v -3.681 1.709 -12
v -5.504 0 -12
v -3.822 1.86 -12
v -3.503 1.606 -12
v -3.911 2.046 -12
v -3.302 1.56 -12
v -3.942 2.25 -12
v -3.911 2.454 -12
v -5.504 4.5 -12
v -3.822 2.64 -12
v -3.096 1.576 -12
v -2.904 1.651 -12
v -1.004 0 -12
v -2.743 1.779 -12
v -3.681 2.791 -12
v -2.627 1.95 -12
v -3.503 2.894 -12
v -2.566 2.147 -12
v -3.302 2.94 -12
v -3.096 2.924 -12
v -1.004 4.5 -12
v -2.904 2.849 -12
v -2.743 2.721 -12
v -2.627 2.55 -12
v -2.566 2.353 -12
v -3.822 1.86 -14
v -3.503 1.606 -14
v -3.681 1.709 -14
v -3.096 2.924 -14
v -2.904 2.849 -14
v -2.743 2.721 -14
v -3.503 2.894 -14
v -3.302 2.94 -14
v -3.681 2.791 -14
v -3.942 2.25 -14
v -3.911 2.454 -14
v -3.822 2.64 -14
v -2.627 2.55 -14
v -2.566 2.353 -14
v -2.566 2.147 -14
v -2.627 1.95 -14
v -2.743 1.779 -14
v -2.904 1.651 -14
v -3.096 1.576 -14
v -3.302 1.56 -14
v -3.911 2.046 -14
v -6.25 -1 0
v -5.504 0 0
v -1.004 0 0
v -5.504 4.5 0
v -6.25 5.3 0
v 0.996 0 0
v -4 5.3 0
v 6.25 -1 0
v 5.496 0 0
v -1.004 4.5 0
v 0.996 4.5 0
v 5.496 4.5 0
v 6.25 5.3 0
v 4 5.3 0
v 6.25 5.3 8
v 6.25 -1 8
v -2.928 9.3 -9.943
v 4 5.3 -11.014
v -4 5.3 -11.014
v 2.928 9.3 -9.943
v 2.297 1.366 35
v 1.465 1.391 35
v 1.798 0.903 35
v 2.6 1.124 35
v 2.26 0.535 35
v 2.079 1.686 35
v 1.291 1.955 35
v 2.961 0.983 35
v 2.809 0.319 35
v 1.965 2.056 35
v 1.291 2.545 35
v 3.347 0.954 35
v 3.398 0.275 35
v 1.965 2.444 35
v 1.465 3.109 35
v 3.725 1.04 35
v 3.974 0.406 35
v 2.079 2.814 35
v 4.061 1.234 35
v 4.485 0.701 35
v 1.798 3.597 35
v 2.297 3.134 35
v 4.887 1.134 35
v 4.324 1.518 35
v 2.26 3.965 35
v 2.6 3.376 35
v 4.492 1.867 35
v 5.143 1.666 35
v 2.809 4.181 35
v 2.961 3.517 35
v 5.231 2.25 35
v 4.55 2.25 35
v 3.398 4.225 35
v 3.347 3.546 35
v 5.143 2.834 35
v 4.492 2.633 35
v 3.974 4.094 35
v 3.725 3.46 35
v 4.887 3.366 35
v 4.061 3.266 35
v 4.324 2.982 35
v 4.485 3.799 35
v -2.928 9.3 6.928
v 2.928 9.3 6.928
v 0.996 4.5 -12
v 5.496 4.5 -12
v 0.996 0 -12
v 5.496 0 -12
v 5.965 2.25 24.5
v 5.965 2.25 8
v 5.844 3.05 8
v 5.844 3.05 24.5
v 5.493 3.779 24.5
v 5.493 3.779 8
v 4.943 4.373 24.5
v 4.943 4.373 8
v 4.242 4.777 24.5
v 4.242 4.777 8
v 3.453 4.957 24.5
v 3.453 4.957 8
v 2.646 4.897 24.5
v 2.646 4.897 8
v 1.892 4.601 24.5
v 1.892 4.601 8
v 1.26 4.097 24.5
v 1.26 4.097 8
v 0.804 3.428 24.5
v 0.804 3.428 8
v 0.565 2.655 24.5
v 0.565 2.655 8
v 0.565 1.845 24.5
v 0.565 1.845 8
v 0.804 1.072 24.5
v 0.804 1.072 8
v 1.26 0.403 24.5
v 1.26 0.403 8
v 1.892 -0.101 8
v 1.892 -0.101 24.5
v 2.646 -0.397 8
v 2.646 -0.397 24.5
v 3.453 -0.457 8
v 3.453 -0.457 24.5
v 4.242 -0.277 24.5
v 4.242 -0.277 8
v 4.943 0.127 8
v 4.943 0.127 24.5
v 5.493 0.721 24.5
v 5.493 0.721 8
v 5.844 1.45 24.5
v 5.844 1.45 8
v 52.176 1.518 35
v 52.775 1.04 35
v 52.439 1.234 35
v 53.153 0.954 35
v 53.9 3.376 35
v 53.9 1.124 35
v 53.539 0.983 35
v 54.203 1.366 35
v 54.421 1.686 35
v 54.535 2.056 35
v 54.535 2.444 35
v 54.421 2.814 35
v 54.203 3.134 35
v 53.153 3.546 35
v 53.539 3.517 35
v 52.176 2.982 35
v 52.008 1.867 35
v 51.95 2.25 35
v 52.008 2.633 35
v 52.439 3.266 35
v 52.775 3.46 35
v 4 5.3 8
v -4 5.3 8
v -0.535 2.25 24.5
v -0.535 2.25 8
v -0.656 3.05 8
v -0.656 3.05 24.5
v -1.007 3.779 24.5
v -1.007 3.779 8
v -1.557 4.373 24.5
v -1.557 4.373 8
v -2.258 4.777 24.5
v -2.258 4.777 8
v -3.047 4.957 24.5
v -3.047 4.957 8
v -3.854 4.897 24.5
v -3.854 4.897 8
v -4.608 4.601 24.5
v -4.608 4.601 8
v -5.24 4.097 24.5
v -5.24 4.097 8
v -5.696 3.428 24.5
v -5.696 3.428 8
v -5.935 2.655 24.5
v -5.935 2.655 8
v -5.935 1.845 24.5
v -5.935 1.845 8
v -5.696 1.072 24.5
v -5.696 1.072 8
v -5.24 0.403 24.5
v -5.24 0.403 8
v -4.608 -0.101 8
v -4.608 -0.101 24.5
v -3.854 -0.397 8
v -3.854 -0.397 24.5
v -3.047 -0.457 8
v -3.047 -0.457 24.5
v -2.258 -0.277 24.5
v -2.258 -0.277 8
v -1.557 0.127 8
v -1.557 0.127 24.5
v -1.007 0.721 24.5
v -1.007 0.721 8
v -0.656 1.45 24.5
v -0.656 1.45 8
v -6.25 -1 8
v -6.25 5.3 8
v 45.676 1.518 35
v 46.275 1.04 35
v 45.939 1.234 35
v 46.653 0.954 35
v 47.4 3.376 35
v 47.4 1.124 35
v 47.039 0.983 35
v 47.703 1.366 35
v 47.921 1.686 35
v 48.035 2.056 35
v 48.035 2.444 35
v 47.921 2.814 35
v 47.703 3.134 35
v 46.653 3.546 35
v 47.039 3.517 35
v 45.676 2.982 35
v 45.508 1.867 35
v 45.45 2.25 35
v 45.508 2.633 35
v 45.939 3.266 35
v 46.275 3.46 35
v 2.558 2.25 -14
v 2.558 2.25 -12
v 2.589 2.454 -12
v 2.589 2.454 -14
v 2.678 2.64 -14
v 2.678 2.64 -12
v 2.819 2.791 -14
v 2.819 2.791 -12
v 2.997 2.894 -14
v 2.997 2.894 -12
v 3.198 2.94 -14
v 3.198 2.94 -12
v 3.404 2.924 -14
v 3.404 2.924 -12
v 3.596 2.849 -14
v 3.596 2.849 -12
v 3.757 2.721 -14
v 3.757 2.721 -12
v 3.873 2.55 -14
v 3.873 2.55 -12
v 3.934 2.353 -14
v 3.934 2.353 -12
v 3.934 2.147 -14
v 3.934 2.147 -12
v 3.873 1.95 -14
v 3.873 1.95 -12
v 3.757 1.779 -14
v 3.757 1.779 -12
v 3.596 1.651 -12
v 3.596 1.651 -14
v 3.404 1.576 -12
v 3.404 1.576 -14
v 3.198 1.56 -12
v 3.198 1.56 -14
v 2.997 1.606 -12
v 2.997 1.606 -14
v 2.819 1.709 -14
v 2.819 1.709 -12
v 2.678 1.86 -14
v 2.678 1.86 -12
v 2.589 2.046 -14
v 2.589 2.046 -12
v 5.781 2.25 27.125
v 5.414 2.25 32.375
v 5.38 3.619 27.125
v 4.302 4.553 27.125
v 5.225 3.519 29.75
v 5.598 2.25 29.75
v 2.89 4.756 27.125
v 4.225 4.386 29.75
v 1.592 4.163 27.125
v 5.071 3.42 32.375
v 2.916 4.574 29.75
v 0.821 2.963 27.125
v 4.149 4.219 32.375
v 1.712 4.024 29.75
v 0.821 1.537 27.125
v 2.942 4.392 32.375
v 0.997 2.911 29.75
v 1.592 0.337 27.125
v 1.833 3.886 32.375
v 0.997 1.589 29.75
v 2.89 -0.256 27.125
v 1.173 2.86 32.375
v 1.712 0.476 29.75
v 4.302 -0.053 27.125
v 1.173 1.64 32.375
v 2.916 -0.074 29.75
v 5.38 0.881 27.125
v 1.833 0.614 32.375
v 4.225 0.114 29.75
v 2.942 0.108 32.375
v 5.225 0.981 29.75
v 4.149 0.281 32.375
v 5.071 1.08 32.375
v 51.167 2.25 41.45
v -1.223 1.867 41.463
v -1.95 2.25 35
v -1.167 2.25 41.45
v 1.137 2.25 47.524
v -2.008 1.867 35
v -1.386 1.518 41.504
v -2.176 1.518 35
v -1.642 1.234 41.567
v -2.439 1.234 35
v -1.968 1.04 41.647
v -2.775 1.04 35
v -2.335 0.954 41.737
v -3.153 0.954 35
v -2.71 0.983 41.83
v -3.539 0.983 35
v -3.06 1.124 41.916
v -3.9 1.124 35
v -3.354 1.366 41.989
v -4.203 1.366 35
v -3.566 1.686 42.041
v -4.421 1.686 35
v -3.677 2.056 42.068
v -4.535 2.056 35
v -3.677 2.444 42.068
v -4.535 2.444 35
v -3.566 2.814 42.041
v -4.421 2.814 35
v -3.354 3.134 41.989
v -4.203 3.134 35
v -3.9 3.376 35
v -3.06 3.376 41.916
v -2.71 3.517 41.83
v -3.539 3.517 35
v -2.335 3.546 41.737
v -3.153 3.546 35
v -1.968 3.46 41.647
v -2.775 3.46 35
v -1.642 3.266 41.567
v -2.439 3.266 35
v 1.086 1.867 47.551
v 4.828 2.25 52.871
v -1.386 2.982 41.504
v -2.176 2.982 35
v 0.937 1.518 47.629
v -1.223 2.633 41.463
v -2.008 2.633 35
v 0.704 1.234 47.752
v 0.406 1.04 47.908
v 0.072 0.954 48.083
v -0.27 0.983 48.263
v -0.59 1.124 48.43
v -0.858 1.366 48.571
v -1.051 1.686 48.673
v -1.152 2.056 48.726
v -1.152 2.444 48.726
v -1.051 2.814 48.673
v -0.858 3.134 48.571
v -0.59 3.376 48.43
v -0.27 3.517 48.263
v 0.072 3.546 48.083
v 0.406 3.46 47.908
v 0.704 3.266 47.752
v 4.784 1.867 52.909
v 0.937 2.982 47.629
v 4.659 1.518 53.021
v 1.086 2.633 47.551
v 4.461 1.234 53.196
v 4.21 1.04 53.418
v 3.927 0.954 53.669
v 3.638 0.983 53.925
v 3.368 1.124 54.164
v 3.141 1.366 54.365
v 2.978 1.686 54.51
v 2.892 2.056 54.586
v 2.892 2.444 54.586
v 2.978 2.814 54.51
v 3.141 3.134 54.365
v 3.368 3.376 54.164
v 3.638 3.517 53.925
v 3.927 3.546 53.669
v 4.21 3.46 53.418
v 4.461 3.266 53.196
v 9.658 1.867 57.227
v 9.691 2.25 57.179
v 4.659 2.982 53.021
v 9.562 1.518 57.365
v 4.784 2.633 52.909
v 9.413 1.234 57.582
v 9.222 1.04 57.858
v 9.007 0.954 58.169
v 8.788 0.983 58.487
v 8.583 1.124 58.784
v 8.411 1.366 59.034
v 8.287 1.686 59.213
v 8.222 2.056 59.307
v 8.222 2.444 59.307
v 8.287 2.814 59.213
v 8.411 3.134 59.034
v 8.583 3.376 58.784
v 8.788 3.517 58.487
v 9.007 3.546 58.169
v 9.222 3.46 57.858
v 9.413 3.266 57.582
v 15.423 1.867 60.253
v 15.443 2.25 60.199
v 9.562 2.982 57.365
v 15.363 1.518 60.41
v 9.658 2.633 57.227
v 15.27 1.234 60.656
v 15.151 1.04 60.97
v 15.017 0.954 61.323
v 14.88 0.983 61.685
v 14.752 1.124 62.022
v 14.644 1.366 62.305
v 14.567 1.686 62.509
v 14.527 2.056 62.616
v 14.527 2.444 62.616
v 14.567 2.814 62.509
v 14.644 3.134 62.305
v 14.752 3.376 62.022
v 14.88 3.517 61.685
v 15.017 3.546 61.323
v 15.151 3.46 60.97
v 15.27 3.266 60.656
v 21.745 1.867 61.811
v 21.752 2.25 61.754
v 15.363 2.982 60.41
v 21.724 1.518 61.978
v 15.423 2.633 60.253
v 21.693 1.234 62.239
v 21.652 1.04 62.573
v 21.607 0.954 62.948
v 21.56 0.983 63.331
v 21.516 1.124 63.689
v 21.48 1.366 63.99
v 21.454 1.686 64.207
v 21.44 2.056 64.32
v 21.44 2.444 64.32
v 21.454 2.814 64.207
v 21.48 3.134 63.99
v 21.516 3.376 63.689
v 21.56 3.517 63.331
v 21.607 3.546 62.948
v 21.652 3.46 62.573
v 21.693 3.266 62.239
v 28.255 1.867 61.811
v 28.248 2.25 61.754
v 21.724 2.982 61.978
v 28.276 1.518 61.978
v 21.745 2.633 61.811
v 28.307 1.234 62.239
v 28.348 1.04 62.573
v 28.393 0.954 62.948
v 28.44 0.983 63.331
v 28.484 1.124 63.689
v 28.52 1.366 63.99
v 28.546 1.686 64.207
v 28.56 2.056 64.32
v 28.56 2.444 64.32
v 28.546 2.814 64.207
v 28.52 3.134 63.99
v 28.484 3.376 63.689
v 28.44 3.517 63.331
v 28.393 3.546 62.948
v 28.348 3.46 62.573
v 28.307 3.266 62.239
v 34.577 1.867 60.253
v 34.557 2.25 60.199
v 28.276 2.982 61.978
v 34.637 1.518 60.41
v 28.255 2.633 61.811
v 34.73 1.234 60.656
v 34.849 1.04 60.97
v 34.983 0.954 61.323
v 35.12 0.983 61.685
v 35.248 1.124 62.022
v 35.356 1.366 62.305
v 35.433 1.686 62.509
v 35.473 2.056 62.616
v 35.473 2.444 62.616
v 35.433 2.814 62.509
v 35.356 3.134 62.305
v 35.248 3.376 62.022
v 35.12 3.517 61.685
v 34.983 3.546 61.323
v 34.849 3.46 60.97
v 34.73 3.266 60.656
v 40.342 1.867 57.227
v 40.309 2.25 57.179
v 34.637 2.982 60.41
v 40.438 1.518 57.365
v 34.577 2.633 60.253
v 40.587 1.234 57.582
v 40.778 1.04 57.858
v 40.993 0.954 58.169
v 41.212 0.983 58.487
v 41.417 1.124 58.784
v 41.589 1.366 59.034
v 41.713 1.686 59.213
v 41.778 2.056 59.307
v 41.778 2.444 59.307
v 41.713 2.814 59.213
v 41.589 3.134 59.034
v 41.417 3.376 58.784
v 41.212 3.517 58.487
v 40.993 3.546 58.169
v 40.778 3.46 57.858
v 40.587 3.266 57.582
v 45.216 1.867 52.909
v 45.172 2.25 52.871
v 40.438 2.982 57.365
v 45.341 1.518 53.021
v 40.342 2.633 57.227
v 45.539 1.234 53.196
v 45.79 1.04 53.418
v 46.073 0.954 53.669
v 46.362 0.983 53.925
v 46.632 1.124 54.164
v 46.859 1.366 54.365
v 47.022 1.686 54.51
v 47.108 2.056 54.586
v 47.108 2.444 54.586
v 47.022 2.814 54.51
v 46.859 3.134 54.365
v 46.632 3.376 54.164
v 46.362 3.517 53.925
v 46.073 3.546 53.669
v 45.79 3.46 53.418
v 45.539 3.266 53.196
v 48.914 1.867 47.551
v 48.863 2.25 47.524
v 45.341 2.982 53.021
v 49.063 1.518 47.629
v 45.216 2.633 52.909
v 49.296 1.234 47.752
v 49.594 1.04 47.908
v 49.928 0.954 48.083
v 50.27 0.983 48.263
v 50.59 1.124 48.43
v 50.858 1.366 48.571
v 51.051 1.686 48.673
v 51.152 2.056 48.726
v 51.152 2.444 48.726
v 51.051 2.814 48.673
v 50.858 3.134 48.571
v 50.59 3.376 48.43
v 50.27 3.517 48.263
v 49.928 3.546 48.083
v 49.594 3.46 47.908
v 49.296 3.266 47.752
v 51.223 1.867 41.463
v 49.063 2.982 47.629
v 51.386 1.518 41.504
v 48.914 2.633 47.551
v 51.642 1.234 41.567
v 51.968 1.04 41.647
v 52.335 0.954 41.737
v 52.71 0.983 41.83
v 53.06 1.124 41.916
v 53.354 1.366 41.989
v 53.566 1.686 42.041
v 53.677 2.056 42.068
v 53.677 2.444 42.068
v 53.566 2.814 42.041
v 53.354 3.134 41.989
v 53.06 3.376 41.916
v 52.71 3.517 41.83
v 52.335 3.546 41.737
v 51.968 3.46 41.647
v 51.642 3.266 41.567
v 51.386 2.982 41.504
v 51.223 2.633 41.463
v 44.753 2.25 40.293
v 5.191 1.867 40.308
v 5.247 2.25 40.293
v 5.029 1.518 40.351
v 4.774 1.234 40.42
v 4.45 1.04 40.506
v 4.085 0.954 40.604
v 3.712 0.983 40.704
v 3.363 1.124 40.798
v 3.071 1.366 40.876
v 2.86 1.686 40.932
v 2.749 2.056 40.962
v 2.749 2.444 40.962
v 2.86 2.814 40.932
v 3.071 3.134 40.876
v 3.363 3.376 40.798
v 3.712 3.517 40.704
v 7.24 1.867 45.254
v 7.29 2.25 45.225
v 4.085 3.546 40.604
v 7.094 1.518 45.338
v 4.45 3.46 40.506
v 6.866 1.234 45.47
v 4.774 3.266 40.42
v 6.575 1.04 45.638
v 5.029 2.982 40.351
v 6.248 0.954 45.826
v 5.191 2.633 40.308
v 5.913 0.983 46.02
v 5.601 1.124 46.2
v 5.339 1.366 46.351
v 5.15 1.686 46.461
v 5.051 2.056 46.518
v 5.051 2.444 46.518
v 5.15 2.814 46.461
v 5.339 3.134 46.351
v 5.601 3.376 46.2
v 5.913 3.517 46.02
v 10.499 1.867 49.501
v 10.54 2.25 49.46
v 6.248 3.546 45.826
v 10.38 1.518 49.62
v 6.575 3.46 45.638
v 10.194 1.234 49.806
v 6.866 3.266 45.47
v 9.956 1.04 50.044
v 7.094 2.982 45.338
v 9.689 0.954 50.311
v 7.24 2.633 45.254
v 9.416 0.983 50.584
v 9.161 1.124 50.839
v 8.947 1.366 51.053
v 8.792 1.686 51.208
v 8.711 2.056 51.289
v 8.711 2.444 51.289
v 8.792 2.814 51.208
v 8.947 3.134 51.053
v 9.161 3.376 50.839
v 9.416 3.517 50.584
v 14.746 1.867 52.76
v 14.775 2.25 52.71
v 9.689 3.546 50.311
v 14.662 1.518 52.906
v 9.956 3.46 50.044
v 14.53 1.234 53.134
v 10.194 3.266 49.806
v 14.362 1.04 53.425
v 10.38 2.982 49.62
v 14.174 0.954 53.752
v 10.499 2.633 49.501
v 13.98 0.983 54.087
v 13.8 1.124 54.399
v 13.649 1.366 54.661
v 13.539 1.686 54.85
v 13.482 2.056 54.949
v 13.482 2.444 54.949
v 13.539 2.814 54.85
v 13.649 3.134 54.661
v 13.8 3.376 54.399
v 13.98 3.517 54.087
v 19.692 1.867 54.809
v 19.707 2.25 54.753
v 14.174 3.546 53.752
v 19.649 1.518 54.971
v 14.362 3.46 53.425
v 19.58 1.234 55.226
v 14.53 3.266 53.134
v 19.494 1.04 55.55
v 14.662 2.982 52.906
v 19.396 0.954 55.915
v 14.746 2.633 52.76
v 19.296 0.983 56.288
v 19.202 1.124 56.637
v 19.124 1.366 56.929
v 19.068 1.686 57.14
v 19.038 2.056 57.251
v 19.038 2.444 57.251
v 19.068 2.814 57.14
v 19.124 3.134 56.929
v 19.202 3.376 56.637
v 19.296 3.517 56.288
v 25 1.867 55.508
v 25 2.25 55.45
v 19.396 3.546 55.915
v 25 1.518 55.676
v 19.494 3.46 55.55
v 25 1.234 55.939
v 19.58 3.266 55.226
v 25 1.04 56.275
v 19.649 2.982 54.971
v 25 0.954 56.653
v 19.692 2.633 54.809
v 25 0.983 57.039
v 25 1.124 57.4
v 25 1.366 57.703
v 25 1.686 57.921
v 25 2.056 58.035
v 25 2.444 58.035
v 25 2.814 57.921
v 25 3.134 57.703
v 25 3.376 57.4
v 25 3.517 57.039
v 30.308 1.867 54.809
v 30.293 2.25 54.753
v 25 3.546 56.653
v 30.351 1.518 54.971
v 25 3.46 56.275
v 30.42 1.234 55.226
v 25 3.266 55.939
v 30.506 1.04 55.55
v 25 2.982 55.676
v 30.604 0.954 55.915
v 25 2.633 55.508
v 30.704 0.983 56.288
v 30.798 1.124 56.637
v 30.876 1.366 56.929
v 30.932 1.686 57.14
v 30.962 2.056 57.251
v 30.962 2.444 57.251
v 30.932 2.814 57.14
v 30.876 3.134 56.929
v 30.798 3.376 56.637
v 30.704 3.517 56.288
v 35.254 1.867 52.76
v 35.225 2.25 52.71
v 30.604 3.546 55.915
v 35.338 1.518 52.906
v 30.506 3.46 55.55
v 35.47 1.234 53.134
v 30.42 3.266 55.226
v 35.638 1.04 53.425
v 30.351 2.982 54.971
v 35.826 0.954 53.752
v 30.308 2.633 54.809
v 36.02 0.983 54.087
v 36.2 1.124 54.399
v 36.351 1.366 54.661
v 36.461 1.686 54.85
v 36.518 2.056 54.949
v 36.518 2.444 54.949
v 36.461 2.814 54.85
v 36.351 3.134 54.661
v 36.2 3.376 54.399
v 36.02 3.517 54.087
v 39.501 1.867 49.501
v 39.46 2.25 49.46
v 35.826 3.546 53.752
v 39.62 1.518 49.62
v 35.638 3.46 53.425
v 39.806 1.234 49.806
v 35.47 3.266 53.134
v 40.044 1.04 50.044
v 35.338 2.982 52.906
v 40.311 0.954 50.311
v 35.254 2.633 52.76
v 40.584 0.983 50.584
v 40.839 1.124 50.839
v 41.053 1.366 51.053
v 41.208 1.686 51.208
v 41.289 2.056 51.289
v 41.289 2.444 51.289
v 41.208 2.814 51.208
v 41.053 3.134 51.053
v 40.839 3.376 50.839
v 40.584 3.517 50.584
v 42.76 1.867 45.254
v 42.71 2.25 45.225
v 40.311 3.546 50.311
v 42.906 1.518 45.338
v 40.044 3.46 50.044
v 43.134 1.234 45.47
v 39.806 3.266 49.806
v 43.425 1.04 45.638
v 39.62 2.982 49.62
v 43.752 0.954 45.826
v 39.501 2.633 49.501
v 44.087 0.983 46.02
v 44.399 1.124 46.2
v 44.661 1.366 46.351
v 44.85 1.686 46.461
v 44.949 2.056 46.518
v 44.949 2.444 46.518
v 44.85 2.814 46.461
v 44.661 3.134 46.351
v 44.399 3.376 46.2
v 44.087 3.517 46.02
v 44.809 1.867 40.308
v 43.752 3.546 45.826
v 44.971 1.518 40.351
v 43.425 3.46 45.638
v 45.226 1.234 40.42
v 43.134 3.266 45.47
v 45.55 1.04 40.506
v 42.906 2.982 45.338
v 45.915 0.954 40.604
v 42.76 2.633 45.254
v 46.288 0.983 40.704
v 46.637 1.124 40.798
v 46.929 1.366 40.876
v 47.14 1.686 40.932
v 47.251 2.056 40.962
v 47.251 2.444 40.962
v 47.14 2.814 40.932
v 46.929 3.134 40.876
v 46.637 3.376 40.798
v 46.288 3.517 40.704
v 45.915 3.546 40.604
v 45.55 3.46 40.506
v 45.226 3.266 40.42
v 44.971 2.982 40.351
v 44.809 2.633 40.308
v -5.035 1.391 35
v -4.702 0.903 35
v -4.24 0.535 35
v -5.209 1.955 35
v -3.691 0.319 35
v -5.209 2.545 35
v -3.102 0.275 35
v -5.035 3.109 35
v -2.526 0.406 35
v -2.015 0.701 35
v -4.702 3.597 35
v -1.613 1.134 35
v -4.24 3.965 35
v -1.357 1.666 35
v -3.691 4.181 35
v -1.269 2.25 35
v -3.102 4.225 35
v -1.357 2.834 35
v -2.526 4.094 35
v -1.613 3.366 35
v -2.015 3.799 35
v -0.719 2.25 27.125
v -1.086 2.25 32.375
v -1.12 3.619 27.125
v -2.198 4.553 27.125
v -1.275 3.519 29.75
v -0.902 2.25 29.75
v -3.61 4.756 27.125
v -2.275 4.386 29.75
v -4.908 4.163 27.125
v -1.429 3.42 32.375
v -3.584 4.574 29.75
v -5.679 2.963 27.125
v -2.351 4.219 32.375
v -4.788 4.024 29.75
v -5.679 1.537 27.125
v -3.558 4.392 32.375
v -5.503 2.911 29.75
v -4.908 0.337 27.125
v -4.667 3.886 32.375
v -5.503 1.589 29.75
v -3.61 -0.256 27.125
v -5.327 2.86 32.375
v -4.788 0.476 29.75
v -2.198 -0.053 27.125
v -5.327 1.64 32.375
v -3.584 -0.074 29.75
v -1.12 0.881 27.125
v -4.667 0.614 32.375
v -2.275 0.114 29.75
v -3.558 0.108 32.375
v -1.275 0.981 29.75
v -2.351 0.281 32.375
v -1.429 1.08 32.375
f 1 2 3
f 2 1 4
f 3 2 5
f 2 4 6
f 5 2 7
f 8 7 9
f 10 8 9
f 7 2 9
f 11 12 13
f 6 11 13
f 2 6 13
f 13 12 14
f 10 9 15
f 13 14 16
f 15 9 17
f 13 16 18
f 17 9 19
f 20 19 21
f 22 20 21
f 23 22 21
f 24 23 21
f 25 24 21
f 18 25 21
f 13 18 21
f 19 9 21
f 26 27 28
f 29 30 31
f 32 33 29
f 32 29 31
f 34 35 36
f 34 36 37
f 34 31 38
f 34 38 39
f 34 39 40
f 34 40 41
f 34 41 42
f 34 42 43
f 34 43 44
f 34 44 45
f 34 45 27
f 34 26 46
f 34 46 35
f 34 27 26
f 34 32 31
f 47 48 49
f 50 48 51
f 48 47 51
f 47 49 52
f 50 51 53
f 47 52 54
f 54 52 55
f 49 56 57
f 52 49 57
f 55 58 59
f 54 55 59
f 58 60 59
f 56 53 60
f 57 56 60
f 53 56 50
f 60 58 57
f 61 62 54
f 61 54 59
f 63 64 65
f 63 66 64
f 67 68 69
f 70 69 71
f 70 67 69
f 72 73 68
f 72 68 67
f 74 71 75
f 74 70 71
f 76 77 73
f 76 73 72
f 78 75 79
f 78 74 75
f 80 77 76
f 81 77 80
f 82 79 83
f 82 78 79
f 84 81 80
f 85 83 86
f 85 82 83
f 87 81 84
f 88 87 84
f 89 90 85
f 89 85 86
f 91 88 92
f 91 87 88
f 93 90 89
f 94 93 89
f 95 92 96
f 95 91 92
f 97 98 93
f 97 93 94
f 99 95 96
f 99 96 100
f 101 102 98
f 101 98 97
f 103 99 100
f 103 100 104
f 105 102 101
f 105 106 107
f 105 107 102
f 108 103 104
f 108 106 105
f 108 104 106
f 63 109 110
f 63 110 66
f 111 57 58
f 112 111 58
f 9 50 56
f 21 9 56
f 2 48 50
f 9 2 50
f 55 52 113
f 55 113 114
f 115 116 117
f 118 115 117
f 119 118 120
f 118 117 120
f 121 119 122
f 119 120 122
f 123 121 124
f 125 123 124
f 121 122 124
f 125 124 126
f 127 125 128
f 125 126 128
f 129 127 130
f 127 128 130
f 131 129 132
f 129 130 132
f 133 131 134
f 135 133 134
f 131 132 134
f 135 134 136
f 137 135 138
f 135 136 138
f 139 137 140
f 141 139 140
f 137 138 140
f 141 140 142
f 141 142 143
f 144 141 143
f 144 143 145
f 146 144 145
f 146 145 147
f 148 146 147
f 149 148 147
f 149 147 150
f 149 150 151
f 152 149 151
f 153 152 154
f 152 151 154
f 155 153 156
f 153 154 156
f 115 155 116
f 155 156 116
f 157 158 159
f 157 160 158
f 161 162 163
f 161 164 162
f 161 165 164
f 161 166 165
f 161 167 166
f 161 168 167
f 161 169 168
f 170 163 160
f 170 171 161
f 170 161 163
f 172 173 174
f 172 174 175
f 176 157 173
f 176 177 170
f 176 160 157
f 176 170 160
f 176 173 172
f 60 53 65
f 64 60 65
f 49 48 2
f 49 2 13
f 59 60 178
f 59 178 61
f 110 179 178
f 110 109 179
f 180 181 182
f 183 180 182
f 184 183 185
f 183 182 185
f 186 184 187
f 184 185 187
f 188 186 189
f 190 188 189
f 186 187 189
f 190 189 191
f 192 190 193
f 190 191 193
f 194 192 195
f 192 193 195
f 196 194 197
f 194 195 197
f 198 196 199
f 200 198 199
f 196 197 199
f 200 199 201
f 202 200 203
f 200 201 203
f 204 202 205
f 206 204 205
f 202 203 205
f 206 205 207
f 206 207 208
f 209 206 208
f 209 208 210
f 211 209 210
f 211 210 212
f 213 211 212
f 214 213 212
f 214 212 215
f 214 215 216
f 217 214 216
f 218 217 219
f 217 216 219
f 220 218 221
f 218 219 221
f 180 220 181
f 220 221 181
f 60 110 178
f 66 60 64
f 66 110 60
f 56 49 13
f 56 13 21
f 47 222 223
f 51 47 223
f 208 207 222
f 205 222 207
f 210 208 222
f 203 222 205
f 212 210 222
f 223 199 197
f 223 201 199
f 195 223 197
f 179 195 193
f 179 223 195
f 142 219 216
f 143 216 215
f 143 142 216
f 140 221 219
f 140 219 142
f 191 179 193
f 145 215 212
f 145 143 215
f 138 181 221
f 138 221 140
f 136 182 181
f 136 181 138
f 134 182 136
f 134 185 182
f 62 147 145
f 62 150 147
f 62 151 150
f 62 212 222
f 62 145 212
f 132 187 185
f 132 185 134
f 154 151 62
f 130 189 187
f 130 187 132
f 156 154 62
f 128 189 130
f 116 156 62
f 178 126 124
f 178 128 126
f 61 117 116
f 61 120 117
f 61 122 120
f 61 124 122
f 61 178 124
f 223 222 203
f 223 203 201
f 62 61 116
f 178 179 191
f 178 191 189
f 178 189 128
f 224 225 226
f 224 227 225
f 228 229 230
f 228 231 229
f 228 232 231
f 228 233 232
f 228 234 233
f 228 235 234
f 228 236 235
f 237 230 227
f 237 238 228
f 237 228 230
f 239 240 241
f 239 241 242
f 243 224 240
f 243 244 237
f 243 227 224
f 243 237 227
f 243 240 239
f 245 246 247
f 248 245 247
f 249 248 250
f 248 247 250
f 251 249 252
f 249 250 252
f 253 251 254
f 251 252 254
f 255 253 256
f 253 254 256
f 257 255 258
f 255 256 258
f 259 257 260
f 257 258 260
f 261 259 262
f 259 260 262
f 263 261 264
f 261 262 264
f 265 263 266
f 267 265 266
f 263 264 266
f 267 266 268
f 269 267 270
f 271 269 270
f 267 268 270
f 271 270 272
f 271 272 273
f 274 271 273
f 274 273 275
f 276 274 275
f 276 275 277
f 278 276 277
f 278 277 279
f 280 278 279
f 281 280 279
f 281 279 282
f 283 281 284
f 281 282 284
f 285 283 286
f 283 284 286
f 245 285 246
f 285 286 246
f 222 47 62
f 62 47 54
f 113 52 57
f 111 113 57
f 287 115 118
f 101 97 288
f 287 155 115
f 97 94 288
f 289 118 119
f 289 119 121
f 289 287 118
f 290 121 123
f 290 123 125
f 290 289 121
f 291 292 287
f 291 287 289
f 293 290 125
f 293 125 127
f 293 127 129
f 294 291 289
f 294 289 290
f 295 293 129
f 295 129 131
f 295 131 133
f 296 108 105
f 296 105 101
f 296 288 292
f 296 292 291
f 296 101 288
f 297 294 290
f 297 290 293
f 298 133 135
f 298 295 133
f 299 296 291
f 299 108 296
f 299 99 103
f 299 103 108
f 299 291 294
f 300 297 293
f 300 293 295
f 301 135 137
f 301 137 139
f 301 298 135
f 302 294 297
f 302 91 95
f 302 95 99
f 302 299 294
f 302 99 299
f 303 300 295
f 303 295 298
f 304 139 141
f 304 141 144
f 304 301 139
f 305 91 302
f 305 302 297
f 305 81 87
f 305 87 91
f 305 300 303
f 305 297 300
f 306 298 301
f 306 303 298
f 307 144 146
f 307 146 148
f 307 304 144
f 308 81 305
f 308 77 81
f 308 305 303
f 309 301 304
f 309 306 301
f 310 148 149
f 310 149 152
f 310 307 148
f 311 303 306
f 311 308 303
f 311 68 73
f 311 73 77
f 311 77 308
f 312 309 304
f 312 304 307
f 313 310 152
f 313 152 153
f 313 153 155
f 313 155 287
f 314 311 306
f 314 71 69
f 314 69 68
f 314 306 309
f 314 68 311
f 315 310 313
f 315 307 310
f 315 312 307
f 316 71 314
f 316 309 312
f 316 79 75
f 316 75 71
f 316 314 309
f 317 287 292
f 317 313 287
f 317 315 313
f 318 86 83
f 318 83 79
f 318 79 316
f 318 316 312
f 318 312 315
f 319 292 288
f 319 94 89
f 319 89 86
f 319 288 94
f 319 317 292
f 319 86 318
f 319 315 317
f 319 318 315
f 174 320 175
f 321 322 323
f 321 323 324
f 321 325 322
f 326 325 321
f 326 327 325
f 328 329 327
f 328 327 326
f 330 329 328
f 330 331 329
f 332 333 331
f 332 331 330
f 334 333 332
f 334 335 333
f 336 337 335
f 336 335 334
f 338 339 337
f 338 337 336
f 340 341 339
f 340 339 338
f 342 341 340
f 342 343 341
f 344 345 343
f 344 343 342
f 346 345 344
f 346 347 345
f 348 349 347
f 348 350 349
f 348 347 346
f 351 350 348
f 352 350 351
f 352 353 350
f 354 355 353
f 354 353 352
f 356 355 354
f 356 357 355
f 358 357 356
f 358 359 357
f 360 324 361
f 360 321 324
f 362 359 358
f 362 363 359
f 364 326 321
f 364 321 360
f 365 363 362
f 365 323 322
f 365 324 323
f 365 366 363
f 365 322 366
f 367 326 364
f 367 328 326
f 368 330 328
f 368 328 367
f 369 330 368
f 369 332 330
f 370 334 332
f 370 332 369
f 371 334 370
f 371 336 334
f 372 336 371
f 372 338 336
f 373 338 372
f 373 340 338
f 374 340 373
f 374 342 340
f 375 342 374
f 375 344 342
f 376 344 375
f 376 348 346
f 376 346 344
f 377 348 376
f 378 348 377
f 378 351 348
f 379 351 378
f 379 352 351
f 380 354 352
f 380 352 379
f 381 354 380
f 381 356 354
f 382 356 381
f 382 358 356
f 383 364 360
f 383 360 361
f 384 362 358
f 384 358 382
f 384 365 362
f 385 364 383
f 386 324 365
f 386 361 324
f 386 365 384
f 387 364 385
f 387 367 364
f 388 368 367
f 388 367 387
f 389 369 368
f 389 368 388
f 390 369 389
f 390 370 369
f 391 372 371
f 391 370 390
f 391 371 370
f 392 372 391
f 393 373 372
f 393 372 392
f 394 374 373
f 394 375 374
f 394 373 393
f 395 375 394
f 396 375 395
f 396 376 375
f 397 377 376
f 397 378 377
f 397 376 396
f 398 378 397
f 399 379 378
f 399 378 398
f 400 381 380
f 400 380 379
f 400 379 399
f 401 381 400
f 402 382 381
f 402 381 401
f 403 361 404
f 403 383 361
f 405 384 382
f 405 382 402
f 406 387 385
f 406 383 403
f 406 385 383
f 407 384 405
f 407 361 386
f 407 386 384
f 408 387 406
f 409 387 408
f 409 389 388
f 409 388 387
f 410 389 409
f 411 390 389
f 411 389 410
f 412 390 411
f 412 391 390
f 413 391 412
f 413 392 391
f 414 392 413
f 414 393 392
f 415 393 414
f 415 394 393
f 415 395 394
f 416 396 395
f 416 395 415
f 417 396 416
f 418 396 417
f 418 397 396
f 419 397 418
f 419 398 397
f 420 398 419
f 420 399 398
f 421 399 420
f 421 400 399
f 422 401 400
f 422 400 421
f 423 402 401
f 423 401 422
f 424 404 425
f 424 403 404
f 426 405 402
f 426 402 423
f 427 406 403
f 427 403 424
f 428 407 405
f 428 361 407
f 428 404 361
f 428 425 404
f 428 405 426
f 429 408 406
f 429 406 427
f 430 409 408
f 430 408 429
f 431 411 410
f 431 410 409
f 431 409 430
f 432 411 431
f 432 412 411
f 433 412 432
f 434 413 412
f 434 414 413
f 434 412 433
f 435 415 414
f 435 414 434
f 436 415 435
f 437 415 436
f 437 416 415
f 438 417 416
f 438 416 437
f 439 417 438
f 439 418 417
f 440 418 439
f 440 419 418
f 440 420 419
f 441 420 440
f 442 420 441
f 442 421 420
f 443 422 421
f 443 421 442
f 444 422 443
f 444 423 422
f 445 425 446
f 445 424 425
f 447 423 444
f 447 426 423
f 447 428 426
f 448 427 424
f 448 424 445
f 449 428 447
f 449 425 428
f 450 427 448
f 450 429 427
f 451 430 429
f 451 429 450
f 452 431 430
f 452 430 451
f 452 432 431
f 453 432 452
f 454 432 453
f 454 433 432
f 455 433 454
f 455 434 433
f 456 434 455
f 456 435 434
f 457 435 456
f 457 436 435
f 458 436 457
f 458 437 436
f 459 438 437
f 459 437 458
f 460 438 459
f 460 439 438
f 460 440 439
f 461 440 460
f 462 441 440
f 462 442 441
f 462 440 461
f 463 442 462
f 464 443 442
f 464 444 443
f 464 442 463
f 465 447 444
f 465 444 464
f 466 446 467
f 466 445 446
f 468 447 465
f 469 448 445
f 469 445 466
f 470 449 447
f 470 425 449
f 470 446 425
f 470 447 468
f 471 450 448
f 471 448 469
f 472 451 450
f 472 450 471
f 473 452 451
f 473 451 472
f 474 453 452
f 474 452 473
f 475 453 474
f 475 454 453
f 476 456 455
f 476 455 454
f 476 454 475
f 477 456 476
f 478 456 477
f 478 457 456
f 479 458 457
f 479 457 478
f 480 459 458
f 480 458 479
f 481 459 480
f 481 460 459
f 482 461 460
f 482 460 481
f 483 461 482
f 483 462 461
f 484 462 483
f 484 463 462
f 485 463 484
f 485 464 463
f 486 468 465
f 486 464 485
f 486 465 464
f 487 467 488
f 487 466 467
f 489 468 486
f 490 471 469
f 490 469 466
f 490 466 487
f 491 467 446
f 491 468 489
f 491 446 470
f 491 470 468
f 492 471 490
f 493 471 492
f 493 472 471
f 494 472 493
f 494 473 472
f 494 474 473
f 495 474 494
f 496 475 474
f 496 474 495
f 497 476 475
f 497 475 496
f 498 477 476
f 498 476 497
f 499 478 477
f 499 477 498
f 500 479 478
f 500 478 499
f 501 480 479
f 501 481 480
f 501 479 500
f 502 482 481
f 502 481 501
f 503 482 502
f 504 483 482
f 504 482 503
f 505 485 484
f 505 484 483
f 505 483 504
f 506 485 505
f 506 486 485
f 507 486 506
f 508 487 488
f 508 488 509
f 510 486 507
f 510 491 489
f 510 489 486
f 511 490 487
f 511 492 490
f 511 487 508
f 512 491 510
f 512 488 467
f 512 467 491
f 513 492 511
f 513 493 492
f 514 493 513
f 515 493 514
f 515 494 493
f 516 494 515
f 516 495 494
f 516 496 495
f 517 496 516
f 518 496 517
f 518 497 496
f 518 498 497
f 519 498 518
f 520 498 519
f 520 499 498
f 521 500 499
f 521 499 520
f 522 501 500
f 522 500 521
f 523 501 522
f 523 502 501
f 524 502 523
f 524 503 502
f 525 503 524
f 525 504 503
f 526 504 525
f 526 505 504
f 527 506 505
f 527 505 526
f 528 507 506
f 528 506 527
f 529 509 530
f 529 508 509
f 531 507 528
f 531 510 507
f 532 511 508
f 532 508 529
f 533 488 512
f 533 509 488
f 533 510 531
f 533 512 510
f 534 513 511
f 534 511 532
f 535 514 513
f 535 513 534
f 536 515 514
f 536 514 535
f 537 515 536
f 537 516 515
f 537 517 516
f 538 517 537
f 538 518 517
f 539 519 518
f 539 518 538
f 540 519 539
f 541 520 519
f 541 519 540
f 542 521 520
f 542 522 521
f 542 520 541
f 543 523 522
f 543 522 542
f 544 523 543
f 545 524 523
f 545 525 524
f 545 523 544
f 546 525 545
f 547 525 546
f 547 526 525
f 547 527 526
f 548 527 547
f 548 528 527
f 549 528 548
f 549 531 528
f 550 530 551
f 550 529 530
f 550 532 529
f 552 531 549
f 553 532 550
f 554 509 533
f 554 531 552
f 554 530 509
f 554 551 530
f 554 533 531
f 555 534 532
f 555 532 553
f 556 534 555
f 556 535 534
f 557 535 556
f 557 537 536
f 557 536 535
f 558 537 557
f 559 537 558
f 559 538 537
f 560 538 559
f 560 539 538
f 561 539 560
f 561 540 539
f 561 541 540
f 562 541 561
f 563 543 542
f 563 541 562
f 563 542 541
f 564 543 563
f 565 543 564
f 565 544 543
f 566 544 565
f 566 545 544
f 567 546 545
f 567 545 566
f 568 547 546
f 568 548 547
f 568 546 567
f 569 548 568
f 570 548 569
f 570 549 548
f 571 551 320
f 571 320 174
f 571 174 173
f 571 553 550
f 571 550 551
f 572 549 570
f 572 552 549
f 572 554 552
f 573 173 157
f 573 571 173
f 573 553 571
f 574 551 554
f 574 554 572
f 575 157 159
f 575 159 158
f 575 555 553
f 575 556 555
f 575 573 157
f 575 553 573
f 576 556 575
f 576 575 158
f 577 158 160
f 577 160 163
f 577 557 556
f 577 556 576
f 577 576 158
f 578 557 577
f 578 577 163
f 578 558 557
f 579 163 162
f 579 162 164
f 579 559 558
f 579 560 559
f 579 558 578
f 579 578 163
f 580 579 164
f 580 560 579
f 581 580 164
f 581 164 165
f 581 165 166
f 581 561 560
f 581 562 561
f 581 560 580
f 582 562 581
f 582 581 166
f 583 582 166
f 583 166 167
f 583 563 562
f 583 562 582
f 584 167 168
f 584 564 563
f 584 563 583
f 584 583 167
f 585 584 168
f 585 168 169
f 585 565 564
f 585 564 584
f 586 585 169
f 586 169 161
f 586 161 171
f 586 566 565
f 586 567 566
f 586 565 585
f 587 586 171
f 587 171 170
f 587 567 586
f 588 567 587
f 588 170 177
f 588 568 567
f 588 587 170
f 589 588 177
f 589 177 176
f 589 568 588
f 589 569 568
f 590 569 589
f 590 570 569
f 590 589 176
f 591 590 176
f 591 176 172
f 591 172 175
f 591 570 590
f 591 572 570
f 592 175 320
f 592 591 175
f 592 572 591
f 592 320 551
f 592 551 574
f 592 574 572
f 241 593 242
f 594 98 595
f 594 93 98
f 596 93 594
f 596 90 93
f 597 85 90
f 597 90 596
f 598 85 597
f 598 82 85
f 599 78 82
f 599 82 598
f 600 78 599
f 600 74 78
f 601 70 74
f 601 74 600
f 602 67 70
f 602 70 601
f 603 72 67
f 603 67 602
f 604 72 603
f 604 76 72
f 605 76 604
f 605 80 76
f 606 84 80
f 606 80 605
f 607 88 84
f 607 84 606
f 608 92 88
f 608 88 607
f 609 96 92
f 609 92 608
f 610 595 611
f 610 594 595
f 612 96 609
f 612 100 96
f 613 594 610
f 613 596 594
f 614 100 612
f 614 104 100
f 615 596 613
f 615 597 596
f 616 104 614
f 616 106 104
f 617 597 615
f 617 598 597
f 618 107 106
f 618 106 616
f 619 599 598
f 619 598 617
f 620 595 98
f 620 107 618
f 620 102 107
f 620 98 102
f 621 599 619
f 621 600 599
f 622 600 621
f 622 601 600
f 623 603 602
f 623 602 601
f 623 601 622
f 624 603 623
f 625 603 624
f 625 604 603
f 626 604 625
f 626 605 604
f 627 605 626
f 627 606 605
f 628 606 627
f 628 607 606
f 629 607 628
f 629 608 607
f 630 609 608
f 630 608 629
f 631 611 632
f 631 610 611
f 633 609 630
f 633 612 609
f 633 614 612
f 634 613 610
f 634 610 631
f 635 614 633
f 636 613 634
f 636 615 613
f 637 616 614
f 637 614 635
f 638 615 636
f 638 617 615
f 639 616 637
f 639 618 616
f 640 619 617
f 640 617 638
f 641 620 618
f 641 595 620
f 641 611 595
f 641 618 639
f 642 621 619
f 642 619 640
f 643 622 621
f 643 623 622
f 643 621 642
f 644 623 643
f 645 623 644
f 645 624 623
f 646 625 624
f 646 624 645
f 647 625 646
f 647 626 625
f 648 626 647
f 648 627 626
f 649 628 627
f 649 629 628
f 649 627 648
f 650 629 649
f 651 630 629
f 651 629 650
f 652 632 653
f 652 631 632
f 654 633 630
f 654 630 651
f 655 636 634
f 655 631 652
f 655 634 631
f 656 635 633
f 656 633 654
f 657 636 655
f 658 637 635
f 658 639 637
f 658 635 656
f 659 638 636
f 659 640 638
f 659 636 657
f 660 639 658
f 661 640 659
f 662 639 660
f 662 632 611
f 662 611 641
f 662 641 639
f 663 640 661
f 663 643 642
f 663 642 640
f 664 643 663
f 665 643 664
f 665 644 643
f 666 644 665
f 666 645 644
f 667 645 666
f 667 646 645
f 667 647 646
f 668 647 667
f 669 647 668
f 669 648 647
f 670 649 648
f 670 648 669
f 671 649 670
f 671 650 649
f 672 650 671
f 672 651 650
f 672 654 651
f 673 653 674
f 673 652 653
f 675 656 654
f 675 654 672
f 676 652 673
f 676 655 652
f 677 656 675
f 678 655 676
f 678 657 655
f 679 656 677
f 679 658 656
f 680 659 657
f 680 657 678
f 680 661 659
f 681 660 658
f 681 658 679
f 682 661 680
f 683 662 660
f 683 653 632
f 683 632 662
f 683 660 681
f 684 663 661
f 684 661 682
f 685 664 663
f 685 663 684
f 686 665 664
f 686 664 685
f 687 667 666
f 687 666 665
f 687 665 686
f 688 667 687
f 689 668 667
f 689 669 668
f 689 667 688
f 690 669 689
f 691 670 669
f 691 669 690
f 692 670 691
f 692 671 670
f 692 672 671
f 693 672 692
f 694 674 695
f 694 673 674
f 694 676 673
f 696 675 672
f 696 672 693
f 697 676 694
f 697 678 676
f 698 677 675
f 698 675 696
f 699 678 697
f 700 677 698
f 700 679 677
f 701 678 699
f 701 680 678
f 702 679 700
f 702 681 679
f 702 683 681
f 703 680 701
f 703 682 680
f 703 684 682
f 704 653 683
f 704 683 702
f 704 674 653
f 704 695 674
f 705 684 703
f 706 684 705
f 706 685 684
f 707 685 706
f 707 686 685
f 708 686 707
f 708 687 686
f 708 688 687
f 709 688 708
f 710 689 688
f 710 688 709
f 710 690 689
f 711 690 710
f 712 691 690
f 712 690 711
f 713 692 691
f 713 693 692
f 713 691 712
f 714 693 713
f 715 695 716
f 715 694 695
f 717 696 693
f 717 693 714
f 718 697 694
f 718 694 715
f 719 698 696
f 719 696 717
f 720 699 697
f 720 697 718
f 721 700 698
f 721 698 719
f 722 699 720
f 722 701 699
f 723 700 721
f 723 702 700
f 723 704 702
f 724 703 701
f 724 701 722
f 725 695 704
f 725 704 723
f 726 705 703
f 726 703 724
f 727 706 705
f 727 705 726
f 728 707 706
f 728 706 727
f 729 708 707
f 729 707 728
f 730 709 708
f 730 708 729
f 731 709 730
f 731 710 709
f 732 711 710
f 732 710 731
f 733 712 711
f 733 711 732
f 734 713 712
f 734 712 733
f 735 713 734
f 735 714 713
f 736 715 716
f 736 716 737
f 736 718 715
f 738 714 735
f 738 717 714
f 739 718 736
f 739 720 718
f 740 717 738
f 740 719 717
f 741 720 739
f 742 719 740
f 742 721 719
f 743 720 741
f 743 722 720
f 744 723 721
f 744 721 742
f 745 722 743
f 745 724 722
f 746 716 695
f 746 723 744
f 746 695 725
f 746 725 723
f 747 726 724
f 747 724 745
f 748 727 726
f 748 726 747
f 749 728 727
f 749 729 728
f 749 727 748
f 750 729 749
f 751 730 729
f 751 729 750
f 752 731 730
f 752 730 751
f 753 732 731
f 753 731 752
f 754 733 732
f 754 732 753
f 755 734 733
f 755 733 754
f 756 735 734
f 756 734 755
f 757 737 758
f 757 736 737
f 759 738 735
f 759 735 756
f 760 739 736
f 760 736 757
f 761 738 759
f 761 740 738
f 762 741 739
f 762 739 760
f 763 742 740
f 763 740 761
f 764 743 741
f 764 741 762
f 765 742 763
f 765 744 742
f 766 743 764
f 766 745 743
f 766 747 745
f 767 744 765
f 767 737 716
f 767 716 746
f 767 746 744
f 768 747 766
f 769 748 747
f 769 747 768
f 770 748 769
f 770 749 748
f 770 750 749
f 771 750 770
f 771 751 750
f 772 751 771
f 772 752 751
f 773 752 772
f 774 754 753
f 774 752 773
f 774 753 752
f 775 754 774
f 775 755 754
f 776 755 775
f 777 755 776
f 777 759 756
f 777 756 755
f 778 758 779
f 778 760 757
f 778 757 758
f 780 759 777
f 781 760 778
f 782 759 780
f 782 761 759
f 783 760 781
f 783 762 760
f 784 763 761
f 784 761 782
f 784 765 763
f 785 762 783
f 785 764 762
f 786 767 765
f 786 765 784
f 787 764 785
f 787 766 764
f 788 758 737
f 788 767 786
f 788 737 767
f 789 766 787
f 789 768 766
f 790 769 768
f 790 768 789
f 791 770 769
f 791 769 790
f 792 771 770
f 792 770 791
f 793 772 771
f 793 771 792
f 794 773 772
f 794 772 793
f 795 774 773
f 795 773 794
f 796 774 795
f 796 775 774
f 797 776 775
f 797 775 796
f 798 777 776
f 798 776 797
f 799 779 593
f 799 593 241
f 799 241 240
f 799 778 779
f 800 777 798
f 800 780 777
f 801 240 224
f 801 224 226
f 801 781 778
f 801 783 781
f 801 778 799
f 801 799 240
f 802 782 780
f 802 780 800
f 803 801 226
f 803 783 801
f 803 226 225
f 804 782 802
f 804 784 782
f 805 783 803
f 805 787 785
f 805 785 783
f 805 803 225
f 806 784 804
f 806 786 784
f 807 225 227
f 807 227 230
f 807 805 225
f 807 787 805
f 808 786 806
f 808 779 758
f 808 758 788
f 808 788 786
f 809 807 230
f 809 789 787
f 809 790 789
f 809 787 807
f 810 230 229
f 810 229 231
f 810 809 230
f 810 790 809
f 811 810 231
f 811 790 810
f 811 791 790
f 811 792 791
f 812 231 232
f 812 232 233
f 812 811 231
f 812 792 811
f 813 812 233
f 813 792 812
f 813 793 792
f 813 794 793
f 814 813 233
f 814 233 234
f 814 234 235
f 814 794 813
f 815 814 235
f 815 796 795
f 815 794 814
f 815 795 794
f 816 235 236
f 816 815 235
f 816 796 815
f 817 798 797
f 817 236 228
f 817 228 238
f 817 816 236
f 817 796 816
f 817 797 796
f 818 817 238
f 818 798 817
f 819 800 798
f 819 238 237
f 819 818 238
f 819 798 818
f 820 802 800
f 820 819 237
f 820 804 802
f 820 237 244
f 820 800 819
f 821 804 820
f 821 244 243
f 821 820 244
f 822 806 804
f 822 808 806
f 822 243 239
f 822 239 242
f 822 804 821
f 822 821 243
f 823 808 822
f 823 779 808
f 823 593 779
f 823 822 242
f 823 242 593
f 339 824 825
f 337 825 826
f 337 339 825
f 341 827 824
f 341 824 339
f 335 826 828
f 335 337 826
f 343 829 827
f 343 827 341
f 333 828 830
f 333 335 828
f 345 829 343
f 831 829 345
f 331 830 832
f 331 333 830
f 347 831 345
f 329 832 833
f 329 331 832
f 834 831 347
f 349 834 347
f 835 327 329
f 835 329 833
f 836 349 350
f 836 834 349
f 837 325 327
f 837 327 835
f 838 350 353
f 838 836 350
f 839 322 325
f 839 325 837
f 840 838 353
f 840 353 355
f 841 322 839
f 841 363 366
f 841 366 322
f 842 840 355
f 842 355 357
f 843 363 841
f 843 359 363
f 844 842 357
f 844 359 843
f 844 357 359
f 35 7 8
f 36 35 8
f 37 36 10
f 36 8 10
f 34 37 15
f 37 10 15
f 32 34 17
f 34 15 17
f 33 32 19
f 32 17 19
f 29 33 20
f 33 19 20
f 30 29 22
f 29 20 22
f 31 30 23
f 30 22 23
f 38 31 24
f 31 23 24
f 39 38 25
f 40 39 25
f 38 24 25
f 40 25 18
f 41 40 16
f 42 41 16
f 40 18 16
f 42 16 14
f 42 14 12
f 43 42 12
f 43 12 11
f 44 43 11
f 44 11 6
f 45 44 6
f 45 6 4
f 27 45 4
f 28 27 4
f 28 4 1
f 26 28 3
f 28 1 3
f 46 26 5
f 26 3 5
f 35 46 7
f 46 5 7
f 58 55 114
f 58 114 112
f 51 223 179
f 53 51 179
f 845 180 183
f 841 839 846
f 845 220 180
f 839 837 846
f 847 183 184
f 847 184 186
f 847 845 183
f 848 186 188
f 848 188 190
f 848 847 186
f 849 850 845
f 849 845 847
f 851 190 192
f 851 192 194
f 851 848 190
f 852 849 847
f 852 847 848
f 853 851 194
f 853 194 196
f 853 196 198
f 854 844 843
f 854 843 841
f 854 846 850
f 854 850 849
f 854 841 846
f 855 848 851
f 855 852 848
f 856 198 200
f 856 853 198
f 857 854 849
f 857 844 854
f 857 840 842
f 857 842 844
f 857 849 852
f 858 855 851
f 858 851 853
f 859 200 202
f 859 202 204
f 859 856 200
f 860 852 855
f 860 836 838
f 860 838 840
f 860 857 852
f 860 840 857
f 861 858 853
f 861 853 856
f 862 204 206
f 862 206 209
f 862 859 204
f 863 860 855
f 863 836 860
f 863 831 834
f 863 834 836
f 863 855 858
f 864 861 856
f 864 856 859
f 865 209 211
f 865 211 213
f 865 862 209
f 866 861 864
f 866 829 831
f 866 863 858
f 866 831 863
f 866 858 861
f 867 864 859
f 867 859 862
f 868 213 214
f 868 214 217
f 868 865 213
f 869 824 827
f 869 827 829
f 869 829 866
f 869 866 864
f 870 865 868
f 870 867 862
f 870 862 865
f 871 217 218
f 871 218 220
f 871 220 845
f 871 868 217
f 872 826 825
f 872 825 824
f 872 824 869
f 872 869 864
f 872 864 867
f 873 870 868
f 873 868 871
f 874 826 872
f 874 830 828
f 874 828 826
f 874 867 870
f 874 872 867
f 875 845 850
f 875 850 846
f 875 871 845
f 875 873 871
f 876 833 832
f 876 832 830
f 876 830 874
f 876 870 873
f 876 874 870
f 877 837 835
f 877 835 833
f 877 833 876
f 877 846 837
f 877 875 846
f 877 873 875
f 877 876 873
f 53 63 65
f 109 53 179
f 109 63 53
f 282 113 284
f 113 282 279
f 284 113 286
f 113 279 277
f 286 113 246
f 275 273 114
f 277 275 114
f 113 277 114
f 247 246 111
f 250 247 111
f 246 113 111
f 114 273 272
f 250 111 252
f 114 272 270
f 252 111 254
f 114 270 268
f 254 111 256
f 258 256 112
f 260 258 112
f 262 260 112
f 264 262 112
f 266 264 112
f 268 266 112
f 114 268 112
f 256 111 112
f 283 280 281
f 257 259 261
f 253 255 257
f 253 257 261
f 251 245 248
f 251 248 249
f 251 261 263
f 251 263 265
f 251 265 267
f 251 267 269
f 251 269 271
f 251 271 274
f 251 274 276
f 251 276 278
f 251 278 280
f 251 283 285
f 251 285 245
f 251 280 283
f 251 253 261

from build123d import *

# Parameters (mm, degrees)
SKETCH1_W             = 4.5
SKETCH1_H             = 4.5
BOSS_EXTRUDE1_DEPTH   = 12
BOSS_EXTRUDE1_2_DEPTH = 12
SKETCH2_R             = 0.691748062
BOSS_EXTRUDE2_DEPTH   = 2
SKETCH3_W             = 12.5
SKETCH3_H             = 6.3
BOSS_EXTRUDE3_DEPTH   = 8
SKETCH4_R             = 2.715
BOSS_EXTRUDE4_DEPTH   = 16.5
SKETCH5_R             = 2.715
BOSS_EXTRUDE5_DEPTH   = 10.5
BOSS_EXTRUDE5_TAPER   = 4
SKETCH8_W             = 8
SKETCH8_H             = 19.014368052
BOSS_EXTRUDE8_DEPTH   = 4
BOSS_EXTRUDE8_TAPER   = 15
PROFILE1_R            = 1.3


with BuildPart() as part:
    # Sketch1 → Boss-Extrude1 (new body)
    with BuildSketch(Plane.XY):
        with Locations((3.245938438, 2.25)):
            Rectangle(SKETCH1_W, SKETCH1_H)
    extrude(amount=-BOSS_EXTRUDE1_DEPTH)



with BuildPart() as body_2:
    # Sketch1 → Boss-Extrude1 2 (new body)
    with BuildSketch(Plane.XY):
        with Locations((-3.254061562, 2.25)):
            Rectangle(SKETCH1_W, SKETCH1_H)
    extrude(amount=-BOSS_EXTRUDE1_2_DEPTH)


with BuildPart() as part_1:
    add(part.part)

    add(body_2.part)  # Boss-Extrude2 merges body 2
    # Sketch2 → Boss-Extrude2 (add)
    with BuildSketch(Plane(origin=(0, 0, -12), x_dir=(-1, 0, 0), z_dir=(0, 0, -1))):
        with Locations((3.25, 2.25)):
            Circle(SKETCH2_R)
        with Locations((-3.25, 2.25)):
            Circle(SKETCH2_R)
    extrude(amount=BOSS_EXTRUDE2_DEPTH)

    # Sketch3 → Boss-Extrude3 (add)
    with BuildSketch(Plane.XY):
        with Locations((0, 2.15)):
            Rectangle(SKETCH3_W, SKETCH3_H)
    extrude(amount=BOSS_EXTRUDE3_DEPTH)

    # Sketch4 → Boss-Extrude4 (add)
    with BuildSketch(Plane.XY.offset(8)):
        with Locations((3.25, 2.25)):
            Circle(SKETCH4_R)
        with Locations((-3.25, 2.25)):
            Circle(SKETCH4_R)
    extrude(amount=BOSS_EXTRUDE4_DEPTH)

    # Sketch5 → Boss-Extrude5 (add)
    with BuildSketch(Plane.XY.offset(24.5)):
        with Locations((-3.25, 2.25)):
            Circle(SKETCH5_R)
        with Locations((3.25, 2.25)):
            Circle(SKETCH5_R)
    extrude(amount=BOSS_EXTRUDE5_DEPTH, taper=BOSS_EXTRUDE5_TAPER)

    # Sketch8 → Boss-Extrude8 (add)
    with BuildSketch(Plane(origin=(0, 5.3, 0), x_dir=(1, 0, 0), z_dir=(0, 1, 0))):
        with Locations((0, 1.507184026)):
            Rectangle(SKETCH8_W, SKETCH8_H)
    extrude(amount=BOSS_EXTRUDE8_DEPTH, taper=BOSS_EXTRUDE8_TAPER)

    # Sweep1: sweep along a path in path1
    with BuildLine(Plane.XZ.offset(-2.25)) as sweep1_path:
        ThreePointArc((0, 35), (25, 60), (50, 35))
    # profile1 → Sweep1 (sweep)
    with BuildSketch(Plane.XY.offset(35)):
        with Locations((-3.25, 2.25)):
            Circle(PROFILE1_R)
        with Locations((3.25, 2.25)):
            Circle(PROFILE1_R)
    sweep(path=sweep1_path.line)


solid = part_1.part
